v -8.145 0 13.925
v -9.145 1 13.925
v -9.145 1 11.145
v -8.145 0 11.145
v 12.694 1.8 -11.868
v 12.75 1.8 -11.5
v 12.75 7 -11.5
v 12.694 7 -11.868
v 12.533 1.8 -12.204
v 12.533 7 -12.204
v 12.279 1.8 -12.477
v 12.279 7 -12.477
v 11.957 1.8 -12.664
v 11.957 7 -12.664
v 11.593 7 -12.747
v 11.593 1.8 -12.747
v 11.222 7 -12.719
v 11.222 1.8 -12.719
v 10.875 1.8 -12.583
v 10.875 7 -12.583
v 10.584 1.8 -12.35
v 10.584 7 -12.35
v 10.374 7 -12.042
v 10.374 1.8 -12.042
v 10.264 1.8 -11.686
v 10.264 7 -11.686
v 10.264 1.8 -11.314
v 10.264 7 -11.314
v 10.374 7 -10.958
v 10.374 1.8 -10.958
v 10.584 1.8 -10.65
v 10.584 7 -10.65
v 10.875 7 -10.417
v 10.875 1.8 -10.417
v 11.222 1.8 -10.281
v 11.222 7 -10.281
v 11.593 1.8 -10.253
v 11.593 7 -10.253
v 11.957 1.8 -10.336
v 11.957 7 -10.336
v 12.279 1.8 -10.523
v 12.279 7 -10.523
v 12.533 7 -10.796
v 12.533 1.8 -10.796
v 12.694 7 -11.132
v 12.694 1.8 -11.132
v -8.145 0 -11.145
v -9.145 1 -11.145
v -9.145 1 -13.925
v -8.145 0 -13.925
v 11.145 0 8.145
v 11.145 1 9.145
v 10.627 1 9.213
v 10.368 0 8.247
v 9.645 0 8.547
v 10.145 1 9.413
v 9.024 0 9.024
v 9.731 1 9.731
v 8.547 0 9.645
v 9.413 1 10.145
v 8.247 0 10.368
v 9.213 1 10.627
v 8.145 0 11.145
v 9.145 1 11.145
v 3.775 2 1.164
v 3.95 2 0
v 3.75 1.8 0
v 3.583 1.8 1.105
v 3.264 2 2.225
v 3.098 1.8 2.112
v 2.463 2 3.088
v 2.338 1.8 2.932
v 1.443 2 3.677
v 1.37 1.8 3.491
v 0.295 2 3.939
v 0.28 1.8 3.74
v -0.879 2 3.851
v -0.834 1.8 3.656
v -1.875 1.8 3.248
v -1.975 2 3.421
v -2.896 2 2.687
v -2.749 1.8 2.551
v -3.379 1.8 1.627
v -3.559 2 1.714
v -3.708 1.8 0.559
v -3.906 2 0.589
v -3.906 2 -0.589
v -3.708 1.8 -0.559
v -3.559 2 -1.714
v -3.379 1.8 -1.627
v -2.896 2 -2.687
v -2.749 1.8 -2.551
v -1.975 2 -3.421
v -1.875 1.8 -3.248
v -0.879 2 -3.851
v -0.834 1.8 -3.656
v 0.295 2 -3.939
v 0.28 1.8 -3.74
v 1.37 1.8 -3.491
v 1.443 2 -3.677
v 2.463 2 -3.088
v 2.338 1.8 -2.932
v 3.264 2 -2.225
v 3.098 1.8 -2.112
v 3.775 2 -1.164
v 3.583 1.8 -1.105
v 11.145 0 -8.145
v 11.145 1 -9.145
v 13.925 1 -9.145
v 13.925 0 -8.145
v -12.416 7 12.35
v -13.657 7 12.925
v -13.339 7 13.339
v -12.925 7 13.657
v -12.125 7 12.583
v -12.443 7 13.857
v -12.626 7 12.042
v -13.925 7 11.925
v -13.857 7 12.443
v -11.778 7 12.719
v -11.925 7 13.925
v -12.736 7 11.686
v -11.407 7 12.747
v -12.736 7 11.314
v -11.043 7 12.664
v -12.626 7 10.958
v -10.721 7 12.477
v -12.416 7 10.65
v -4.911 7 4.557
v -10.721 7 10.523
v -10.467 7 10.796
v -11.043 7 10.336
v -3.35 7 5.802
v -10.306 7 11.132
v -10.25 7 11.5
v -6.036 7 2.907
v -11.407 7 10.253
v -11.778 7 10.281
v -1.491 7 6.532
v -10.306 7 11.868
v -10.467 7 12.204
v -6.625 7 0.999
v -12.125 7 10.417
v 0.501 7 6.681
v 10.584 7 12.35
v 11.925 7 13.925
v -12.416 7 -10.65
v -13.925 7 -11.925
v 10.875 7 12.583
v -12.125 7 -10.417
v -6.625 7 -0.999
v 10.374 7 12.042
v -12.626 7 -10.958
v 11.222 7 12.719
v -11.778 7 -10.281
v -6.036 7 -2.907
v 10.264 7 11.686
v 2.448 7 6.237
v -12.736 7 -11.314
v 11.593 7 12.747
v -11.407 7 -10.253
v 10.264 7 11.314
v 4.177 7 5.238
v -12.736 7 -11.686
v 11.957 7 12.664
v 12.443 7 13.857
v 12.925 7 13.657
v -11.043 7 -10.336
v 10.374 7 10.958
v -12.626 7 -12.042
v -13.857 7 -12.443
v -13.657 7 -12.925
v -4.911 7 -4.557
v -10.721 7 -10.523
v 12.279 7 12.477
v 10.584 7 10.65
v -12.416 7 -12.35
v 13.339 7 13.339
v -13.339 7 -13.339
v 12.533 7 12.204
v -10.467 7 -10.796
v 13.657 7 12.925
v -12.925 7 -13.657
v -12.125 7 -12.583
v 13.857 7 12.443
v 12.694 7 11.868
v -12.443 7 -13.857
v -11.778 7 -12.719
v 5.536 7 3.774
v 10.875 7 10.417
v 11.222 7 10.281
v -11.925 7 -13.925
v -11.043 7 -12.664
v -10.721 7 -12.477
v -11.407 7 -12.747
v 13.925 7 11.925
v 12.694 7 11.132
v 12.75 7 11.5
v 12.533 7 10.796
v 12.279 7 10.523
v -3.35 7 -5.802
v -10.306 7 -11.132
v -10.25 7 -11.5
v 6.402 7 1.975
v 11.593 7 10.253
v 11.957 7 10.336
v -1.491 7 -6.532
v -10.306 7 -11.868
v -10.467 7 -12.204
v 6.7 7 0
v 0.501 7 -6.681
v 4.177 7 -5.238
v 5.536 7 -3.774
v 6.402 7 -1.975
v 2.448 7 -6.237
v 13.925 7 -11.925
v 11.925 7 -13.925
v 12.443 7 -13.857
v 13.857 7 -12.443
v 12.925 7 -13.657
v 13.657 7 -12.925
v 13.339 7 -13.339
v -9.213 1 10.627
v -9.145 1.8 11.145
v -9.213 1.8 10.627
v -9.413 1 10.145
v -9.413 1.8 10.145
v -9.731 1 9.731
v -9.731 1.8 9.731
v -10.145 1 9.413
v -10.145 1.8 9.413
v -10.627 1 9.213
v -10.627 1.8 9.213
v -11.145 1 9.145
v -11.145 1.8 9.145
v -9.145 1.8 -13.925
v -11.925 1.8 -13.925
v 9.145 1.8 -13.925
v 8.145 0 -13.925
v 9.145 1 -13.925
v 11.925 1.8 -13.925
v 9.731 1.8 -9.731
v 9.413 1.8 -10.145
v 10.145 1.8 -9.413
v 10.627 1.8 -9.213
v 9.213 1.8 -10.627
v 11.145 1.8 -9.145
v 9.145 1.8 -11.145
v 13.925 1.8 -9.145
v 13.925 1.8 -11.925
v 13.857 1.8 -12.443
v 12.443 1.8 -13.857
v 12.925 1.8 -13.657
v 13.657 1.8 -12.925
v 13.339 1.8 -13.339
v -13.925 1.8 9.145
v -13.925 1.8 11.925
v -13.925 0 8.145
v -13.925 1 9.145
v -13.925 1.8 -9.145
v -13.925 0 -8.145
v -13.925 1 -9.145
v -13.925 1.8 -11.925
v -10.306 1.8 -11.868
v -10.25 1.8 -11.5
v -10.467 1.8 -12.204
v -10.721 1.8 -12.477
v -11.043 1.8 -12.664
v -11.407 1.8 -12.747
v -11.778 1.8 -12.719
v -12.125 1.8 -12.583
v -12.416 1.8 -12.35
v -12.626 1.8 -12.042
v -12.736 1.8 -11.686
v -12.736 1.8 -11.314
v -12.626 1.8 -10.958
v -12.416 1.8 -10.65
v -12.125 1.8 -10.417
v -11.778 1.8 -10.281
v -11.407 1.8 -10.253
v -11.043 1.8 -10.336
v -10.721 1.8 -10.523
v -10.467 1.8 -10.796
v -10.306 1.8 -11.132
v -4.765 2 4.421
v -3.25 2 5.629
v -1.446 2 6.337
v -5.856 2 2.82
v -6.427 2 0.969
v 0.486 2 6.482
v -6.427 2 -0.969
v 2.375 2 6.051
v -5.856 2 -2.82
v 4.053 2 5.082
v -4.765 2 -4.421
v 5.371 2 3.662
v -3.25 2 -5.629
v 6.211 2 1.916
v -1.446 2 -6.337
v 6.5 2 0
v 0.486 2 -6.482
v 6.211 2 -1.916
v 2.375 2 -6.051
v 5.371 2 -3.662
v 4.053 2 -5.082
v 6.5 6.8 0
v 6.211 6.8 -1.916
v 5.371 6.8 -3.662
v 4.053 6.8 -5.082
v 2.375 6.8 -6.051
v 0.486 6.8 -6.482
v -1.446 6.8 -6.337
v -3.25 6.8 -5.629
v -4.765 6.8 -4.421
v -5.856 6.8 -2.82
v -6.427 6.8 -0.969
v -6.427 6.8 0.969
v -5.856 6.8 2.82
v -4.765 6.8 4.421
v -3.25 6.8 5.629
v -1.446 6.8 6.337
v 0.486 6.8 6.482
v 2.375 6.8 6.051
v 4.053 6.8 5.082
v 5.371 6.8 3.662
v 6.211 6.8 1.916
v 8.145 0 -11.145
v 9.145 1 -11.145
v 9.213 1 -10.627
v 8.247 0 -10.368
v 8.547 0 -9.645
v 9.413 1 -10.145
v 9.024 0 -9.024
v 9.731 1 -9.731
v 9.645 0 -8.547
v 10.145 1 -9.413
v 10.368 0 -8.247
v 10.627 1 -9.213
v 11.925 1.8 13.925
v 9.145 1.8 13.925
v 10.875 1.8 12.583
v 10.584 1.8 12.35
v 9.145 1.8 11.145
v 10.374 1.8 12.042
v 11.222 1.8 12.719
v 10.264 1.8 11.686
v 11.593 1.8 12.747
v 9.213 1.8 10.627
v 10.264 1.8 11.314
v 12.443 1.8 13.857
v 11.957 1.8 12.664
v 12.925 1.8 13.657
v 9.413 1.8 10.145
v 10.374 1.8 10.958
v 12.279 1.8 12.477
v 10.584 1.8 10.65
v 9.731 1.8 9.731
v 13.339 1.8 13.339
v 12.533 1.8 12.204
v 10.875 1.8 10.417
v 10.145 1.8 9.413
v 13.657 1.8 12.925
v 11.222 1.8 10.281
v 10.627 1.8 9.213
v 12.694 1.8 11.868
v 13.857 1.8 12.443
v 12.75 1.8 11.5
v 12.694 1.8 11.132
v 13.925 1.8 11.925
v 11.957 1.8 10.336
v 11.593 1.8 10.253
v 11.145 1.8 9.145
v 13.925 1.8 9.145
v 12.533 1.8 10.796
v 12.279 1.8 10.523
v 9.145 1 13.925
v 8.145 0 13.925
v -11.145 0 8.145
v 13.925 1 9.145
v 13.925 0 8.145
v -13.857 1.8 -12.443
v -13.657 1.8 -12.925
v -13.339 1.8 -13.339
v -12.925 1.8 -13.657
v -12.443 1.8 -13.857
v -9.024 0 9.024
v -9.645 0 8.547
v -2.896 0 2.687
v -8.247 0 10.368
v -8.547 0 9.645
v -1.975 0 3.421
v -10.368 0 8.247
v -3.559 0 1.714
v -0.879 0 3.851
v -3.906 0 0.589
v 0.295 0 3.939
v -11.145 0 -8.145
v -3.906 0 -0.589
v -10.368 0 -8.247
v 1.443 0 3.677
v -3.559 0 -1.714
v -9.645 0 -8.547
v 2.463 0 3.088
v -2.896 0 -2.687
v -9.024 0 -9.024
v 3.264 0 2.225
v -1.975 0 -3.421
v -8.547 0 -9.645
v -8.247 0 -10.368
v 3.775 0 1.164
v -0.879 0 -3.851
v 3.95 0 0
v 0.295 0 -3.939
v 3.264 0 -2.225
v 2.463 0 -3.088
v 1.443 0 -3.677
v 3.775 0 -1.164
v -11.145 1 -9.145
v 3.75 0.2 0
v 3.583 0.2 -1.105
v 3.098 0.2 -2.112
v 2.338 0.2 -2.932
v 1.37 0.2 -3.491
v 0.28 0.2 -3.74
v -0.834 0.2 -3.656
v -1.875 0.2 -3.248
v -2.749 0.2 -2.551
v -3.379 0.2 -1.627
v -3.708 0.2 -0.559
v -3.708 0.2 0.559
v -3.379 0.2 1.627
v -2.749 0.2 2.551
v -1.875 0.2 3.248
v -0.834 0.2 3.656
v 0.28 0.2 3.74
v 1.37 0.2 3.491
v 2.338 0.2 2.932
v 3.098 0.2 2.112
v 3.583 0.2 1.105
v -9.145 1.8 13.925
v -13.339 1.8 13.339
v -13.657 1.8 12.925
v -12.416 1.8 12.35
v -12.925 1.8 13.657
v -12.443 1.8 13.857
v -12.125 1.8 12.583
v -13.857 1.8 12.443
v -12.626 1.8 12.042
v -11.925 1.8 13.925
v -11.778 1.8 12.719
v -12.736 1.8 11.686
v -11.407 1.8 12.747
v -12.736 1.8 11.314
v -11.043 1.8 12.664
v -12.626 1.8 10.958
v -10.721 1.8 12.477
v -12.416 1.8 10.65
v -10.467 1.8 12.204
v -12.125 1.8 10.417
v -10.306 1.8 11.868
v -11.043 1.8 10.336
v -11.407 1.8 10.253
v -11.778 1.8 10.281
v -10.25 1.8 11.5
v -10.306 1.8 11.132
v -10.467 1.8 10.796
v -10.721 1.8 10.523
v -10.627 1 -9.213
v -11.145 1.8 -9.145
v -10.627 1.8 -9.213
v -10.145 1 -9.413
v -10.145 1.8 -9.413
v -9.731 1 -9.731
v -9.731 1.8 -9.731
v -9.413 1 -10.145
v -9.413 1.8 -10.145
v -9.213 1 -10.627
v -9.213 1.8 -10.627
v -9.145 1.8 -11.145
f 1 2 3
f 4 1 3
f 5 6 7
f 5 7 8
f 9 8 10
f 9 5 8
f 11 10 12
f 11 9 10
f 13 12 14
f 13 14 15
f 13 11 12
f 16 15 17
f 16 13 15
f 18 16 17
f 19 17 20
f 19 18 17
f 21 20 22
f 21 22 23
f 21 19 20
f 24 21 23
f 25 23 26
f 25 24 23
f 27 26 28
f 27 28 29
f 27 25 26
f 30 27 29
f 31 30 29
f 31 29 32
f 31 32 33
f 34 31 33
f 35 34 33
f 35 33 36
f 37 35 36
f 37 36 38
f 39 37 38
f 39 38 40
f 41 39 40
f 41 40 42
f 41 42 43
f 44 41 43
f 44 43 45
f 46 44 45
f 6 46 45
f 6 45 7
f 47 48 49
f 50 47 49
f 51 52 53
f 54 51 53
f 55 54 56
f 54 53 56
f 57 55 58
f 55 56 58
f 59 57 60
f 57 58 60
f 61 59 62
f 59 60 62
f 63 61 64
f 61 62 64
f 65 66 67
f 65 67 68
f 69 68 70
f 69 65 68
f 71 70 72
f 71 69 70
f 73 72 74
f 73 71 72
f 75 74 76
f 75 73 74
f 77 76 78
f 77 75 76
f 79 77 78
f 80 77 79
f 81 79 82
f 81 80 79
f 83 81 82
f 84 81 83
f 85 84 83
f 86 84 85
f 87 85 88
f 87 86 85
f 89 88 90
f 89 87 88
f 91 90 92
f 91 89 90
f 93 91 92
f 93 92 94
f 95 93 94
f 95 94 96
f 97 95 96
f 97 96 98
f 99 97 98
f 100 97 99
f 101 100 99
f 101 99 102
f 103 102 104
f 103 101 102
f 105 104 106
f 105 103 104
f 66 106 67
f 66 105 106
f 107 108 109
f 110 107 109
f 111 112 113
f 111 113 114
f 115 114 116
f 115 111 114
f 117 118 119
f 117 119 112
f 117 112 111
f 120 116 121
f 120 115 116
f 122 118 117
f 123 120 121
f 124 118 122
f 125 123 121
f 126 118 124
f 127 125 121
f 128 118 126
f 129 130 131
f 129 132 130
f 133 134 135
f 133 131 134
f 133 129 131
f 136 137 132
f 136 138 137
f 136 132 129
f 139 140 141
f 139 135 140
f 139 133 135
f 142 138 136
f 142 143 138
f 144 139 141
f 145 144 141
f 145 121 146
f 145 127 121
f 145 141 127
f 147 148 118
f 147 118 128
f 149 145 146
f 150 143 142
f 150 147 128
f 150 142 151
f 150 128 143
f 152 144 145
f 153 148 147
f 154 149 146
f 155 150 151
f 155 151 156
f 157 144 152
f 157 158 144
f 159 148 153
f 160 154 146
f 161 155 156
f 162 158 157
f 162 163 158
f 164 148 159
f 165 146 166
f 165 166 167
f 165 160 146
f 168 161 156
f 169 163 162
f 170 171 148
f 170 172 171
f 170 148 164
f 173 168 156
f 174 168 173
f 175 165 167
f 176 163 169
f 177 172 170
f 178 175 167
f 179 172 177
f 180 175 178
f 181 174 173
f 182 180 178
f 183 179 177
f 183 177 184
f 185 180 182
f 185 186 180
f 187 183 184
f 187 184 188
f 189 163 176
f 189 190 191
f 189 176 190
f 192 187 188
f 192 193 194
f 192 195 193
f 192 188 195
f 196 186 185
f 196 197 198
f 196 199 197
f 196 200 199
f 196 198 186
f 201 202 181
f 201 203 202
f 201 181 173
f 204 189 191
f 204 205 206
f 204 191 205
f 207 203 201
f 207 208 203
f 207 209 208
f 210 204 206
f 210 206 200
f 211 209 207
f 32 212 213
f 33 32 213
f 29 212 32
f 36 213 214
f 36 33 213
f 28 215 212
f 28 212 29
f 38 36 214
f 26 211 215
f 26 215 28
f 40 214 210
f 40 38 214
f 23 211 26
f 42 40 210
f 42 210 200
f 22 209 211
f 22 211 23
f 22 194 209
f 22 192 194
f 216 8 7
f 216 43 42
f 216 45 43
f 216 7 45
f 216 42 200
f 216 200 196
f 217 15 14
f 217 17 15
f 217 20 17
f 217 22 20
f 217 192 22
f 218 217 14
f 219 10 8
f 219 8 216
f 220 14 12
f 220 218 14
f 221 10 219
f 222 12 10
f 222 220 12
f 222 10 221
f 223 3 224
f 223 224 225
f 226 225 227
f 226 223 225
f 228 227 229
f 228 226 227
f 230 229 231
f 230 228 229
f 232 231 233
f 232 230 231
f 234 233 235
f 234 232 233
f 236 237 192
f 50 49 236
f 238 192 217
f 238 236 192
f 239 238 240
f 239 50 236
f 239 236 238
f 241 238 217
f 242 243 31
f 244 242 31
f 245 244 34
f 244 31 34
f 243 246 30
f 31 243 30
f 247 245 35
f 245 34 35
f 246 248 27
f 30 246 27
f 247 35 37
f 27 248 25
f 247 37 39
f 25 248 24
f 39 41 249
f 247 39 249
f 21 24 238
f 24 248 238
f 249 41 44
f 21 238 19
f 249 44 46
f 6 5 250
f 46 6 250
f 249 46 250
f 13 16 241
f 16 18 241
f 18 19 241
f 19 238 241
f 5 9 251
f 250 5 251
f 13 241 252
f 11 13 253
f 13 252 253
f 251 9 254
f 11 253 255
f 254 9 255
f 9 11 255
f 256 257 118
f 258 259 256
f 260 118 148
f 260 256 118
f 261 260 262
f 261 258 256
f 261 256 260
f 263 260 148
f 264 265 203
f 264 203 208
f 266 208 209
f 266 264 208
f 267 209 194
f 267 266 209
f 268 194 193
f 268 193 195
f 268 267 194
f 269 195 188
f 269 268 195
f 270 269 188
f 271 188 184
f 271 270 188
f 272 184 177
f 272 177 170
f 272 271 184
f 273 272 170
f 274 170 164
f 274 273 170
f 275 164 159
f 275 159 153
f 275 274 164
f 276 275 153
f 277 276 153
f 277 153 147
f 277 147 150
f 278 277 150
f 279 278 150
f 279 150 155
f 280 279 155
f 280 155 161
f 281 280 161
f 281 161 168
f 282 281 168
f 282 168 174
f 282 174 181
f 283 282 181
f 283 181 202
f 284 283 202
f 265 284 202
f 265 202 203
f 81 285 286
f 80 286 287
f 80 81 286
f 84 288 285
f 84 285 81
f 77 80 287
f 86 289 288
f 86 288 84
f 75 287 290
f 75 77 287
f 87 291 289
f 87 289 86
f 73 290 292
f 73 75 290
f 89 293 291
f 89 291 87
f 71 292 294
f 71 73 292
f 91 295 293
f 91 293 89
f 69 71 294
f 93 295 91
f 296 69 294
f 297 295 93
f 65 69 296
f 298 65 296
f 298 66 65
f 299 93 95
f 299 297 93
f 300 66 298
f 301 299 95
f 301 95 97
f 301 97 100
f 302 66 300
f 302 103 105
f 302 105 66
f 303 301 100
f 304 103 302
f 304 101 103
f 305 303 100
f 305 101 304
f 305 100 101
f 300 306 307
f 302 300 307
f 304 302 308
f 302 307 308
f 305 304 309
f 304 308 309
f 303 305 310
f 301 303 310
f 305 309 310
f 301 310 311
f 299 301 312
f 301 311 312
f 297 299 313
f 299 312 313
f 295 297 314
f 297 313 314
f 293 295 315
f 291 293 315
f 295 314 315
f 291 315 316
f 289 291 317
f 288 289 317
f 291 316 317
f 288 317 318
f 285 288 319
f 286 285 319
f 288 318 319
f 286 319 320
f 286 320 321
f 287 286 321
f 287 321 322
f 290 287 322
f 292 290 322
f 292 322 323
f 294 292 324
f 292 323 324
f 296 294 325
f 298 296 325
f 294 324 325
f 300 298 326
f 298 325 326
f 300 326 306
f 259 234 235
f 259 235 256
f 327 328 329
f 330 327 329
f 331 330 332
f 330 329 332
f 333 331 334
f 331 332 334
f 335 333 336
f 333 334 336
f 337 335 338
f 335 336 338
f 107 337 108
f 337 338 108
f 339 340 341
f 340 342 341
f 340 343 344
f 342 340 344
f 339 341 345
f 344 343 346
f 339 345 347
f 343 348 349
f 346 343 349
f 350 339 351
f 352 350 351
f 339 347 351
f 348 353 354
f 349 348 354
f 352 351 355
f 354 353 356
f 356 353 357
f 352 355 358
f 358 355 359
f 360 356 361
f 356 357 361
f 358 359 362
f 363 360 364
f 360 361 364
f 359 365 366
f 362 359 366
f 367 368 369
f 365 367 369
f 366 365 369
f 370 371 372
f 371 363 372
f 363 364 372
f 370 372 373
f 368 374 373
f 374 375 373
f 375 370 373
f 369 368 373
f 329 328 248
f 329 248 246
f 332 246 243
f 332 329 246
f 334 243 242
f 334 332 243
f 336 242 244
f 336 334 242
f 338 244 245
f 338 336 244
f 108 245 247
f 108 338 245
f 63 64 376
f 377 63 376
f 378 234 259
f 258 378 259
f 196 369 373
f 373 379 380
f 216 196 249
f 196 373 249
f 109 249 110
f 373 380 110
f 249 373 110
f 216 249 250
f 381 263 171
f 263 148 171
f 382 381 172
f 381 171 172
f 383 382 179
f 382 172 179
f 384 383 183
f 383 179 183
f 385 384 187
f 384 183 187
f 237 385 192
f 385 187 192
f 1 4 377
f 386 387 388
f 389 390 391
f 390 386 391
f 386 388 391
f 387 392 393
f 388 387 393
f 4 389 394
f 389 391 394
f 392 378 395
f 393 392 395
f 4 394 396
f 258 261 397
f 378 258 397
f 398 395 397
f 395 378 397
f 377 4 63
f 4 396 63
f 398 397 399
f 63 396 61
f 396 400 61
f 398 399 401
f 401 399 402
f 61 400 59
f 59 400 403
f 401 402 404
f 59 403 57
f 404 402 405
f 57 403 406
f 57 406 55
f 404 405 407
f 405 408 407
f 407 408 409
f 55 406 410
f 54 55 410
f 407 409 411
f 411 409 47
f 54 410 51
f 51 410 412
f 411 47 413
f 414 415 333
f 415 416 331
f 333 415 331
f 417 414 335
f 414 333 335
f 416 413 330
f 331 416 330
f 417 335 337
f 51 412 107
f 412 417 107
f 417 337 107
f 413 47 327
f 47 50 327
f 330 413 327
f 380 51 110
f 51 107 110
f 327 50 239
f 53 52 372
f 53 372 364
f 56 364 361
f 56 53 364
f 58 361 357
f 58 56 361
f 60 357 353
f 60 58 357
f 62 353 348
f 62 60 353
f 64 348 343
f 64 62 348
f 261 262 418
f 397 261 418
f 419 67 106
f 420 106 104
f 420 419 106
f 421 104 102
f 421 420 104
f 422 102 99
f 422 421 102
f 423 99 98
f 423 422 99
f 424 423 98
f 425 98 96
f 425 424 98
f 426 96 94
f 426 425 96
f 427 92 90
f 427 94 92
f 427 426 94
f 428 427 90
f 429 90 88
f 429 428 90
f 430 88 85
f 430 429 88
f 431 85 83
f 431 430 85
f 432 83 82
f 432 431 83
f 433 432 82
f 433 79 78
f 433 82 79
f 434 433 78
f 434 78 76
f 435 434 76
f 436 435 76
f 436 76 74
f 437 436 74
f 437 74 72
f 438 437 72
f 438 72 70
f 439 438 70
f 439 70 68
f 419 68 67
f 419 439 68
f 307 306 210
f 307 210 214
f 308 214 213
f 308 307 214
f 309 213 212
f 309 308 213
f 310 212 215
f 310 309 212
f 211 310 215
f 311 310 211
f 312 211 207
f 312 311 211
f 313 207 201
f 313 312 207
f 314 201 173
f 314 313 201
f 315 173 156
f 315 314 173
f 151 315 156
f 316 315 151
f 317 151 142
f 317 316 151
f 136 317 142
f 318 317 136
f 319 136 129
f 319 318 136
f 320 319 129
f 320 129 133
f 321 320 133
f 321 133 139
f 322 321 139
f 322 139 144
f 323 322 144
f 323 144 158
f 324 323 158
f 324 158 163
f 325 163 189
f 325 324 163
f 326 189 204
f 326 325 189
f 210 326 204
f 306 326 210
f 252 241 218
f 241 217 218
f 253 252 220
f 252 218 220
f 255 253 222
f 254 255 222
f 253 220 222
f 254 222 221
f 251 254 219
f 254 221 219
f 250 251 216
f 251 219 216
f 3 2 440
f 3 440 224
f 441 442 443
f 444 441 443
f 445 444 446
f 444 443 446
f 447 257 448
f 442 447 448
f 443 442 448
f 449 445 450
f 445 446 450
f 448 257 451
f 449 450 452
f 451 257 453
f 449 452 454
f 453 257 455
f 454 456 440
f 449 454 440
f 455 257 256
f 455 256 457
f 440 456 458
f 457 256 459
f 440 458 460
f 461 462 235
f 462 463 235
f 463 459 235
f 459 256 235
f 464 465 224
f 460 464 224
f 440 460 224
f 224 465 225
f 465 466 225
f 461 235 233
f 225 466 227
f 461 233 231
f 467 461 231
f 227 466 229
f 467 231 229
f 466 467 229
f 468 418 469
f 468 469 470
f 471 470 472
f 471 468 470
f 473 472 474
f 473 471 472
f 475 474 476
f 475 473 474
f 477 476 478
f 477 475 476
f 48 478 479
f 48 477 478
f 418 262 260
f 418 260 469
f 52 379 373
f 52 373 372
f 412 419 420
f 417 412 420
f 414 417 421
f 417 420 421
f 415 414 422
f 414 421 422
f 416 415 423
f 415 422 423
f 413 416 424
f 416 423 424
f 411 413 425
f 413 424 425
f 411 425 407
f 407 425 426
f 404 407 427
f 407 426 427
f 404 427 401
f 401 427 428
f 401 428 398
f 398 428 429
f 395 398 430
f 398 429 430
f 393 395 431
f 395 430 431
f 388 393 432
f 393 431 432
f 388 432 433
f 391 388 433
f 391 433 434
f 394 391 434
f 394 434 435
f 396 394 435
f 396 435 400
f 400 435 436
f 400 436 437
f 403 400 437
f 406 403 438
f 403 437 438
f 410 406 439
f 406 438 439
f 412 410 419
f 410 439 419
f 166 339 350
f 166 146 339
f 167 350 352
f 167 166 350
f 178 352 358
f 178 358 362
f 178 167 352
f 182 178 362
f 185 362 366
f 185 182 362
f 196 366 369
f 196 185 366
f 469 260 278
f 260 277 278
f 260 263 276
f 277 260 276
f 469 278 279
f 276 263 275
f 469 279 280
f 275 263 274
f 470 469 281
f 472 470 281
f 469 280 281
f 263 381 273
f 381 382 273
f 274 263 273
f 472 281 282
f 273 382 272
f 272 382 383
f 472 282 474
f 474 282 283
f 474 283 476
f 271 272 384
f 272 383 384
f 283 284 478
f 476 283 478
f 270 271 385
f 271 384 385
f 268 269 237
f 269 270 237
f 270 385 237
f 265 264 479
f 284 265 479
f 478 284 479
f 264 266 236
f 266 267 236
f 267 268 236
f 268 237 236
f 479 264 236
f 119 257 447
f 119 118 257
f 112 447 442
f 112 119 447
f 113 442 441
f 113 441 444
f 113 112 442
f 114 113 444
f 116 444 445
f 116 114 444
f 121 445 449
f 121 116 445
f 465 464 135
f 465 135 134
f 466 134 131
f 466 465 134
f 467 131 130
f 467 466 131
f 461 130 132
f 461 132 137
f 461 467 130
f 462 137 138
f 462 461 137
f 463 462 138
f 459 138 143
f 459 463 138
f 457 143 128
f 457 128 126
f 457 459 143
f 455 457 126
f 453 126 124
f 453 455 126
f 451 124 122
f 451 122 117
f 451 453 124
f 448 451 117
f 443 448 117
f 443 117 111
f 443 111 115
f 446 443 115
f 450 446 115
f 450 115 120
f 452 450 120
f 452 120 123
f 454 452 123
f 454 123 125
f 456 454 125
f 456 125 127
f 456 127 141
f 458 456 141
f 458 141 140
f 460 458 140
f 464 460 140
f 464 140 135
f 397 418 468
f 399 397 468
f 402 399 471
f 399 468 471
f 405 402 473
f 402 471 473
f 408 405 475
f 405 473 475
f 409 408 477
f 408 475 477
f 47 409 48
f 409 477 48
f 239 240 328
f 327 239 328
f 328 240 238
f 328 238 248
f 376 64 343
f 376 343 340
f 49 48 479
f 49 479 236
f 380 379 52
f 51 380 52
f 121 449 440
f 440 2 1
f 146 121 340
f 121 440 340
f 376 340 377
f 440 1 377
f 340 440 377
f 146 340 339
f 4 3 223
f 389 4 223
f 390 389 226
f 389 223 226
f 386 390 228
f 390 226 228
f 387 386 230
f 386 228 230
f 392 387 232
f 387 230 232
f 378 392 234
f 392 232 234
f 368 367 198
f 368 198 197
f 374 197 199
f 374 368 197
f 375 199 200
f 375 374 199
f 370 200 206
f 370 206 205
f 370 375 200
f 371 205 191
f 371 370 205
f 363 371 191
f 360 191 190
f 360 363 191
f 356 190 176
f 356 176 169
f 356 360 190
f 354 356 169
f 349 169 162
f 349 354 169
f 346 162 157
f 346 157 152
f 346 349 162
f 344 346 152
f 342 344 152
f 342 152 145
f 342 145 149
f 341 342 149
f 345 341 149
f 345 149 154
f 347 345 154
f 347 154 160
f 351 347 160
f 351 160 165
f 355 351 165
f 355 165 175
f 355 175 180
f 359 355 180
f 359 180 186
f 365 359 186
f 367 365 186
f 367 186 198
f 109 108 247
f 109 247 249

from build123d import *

# Parameters (mm, degrees)
SKETCH_1_W          = 27.85
SKETCH_1_H          = 27.85
SKETCH_1_R          = 1.25
SKETCH_1_R_2        = 3.75
EXTRUDE_1_DEPTH     = 7
SKETCH_1_4_R        = 1.25
CUT_EXTRUDE_1_DEPTH = 1.8
CHAMFER_1_SIZE      = 1
FILLET_1_R          = 2
SKETCH_3_R          = 6.5
CUT_EXTRUDE_2_DEPTH = 5
CHAMFER_2_SIZE      = 0.2


with BuildPart() as part:
    # Эскиз1 → Бобышка-Вытянуть1 (new body)
    with BuildSketch(Plane(origin=(0, 0, 0), x_dir=(1, 0, 0), z_dir=(0, 1, 0))):
        Rectangle(SKETCH_1_W, SKETCH_1_H)
        with Locations((-11.5, 11.5)):
            Circle(SKETCH_1_R, mode=Mode.SUBTRACT)
        Circle(SKETCH_1_R_2, mode=Mode.SUBTRACT)
        with Locations((11.5, 11.5)):
            Circle(SKETCH_1_R, mode=Mode.SUBTRACT)
        with Locations((11.5, -11.5)):
            Circle(SKETCH_1_R, mode=Mode.SUBTRACT)
        with Locations((-11.5, -11.5)):
            Circle(SKETCH_1_R, mode=Mode.SUBTRACT)
    extrude(amount=EXTRUDE_1_DEPTH)

    # Эскиз1<4> → Вырез-Вытянуть1 (cut)
    # profile 1 of 4: a face of its own
    with BuildSketch(Plane(origin=(0, 0, 0), x_dir=(1, 0, 0), z_dir=(0, 1, 0))):
        with BuildLine():
            Line((-9.144874717, 13.925), (-13.925, 13.925))
            Line((-13.925, 13.925), (-13.925, 9.144874717))
            Line((-13.925, 9.144874717), (-11.144874717, 9.144874717))
            ThreePointArc((-11.144874717, 9.144874717), (-9.730661155, 9.730661155), (-9.144874717, 11.144874717))
            Line((-9.144874717, 11.144874717), (-9.144874717, 13.925))
        make_face()
        with Locations((-11.5, 11.5)):
            Circle(SKETCH_1_4_R, mode=Mode.SUBTRACT)
    # profile 2 of 4: a face of its own
    with BuildSketch(Plane(origin=(0, 0, 0), x_dir=(1, 0, 0), z_dir=(0, 1, 0))):
        with BuildLine():
            Line((13.925, 13.925), (9.144874717, 13.925))
            Line((9.144874717, 13.925), (9.144874717, 11.144874717))
            ThreePointArc((9.144874717, 11.144874717), (9.730661155, 9.730661155), (11.144874717, 9.144874717))
            Line((11.144874717, 9.144874717), (13.925, 9.144874717))
            Line((13.925, 9.144874717), (13.925, 13.925))
        make_face()
        with Locations((11.5, 11.5)):
            Circle(SKETCH_1_4_R, mode=Mode.SUBTRACT)
    # profile 3 of 4: a face of its own
    with BuildSketch(Plane(origin=(0, 0, 0), x_dir=(1, 0, 0), z_dir=(0, 1, 0))):
        with BuildLine():
            Line((-11.144874717, -9.144874717), (-13.925, -9.144874717))
            Line((-13.925, -9.144874717), (-13.925, -13.925))
            Line((-13.925, -13.925), (-9.144874717, -13.925))
            Line((-9.144874717, -13.925), (-9.144874717, -11.144874717))
            ThreePointArc((-9.144874717, -11.144874717), (-9.730661155, -9.730661155), (-11.144874717, -9.144874717))
        make_face()
        with Locations((-11.5, -11.5)):
            Circle(SKETCH_1_4_R, mode=Mode.SUBTRACT)
    # profile 4 of 4: a face of its own
    with BuildSketch(Plane(origin=(0, 0, 0), x_dir=(1, 0, 0), z_dir=(0, 1, 0))):
        with BuildLine():
            Line((13.925, -13.925), (13.925, -9.144874717))
            Line((13.925, -9.144874717), (11.144874717, -9.144874717))
            ThreePointArc((11.144874717, -9.144874717), (9.730661155, -9.730661155), (9.144874717, -11.144874717))
            Line((9.144874717, -11.144874717), (9.144874717, -13.925))
            Line((9.144874717, -13.925), (13.925, -13.925))
        make_face()
        with Locations((11.5, -11.5)):
            Circle(SKETCH_1_4_R, mode=Mode.SUBTRACT)
    extrude(amount=CUT_EXTRUDE_1_DEPTH, mode=Mode.SUBTRACT)

    # Фаска1
    chamfer_1_edges = [part.edges().sort_by_distance(p)[0] for p in [
        (9.144874717, 0, 12.534937359),
        (9.730661155, 0, 9.730661155),
        (12.534937359, 0, 9.144874717),
        (12.534937359, 0, -9.144874717),
        (9.730661155, 0, -9.730661155),
        (9.144874717, 0, -12.534937359),
        (-12.534937359, 0, 9.144874717),
        (-9.144874717, 0, 12.534937359),
        (-9.730661155, 0, 9.730661155),
        (-9.144874717, 0, -12.534937359),
        (-12.534937359, 0, -9.144874717),
        (-9.730661155, 0, -9.730661155),
    ]]
    chamfer(chamfer_1_edges, length=CHAMFER_1_SIZE)

    # Скругление1
    fillet_1_edges = [part.edges().sort_by_distance(p)[0] for p in [
        (-13.925, 4.4, -13.925),
        (-13.925, 4.4, 13.925),
        (13.925, 4.4, 13.925),
        (13.925, 4.4, -13.925),
    ]]
    fillet(fillet_1_edges, radius=FILLET_1_R)

    # Эскиз3 → Вырез-Вытянуть2 (cut)
    with BuildSketch(Plane(origin=(0, 7, 0), x_dir=(1, 0, 0), z_dir=(0, 1, 0))):
        Circle(SKETCH_3_R)
    extrude(amount=-CUT_EXTRUDE_2_DEPTH, mode=Mode.SUBTRACT)

    # Фаска2
    chamfer_2_edges = [part.edges().sort_by_distance(p)[0] for p in [
        (-3.75, 2, 0),
        (-6.5, 7, 0),
        (-3.75, 0, 0),
    ]]
    chamfer(chamfer_2_edges, length=CHAMFER_2_SIZE)


solid = part.part
